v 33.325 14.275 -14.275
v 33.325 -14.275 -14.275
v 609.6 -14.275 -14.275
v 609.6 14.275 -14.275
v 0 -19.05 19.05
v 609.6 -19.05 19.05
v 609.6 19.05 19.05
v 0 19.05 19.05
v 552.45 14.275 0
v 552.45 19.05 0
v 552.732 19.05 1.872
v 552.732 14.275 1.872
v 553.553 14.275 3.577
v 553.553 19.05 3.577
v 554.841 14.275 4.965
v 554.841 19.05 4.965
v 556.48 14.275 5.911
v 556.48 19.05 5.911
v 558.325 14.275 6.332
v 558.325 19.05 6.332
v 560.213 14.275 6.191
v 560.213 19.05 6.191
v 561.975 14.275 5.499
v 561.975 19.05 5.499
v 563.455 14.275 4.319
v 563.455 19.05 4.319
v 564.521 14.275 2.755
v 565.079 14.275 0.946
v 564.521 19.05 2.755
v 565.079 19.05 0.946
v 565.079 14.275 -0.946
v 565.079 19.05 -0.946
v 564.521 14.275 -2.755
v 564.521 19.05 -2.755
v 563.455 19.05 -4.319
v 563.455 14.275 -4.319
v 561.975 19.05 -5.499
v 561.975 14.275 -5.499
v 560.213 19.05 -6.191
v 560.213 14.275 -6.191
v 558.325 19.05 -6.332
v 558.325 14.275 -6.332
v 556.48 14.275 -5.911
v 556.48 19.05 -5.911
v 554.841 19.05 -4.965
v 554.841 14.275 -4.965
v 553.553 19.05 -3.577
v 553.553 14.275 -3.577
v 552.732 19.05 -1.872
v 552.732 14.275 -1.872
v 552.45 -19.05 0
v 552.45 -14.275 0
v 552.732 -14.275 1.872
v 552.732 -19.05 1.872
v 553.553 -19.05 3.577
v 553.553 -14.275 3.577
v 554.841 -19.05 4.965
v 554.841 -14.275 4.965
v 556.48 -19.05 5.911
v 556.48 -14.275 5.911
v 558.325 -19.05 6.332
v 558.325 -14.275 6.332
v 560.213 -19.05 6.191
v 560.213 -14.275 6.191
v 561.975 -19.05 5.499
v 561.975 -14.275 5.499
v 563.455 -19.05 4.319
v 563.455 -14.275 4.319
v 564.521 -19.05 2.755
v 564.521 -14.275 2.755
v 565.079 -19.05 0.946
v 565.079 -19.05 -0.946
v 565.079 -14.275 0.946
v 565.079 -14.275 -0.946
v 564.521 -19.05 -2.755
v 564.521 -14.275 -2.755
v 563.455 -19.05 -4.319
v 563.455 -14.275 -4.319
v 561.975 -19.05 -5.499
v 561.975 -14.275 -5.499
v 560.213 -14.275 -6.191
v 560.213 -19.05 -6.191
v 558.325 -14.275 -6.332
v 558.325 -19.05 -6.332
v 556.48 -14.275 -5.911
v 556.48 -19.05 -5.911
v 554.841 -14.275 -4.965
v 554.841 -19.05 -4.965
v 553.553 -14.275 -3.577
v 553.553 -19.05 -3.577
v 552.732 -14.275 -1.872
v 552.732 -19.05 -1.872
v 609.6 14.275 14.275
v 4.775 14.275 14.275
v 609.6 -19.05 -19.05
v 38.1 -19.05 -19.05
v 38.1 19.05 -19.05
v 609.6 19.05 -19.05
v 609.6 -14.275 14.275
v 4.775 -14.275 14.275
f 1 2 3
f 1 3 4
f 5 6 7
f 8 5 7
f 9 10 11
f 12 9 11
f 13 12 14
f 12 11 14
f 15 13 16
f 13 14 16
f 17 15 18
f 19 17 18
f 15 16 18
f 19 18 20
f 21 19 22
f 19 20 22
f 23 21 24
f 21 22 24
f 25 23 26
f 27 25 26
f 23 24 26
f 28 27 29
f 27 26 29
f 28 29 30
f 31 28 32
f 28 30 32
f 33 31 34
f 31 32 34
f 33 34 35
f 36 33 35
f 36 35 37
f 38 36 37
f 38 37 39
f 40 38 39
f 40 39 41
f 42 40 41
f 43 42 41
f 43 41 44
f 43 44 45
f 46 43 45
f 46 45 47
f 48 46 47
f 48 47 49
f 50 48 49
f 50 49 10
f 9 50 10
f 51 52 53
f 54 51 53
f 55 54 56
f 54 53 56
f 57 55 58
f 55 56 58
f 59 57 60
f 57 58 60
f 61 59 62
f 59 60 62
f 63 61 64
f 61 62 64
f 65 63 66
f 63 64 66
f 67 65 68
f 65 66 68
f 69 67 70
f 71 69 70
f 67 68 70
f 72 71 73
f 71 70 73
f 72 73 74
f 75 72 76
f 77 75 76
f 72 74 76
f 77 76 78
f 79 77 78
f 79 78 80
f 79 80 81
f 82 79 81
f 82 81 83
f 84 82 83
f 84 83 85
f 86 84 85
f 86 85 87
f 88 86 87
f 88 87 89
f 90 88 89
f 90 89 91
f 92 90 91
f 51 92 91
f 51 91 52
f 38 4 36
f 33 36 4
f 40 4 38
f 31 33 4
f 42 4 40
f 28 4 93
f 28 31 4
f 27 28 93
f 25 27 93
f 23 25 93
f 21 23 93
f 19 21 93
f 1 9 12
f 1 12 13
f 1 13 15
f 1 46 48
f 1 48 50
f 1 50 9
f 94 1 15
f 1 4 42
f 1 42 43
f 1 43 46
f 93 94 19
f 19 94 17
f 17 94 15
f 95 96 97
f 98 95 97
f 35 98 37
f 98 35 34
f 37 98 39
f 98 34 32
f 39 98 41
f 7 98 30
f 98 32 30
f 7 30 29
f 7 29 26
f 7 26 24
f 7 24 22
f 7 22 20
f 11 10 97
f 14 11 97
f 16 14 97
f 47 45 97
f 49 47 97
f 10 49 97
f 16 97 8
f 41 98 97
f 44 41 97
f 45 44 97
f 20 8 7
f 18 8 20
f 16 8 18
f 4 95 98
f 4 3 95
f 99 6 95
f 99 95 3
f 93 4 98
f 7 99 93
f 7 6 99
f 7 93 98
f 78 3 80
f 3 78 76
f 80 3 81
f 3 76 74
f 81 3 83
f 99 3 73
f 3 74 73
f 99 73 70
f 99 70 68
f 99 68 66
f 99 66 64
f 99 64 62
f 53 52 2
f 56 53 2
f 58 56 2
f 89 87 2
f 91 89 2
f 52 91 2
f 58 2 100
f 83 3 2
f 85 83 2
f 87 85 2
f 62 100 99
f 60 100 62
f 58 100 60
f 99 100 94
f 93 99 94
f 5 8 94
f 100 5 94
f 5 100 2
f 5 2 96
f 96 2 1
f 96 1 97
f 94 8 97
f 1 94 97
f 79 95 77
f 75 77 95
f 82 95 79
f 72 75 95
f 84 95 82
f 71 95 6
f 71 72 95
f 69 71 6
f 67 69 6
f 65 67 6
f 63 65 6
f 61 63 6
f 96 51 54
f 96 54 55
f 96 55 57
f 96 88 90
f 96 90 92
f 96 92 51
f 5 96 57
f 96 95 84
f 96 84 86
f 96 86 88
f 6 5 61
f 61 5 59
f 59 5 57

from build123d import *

# Parameters (mm, degrees)
F0_W     = 38.1
F0_H     = 38.1
F0_W_2   = 28.5496
F0_H_2   = 28.5496
F1_DEPTH = 609.6
F3_DEPTH = 38.101
F4_R     = 6.35
F5_DEPTH = 38.101


with BuildPart() as f1:
    # F0 (on Right) → F1 (new body)
    with BuildSketch(Plane.YZ):
        Rectangle(F0_W, F0_H)
        Rectangle(F0_W_2, F0_H_2, mode=Mode.SUBTRACT)
    extrude(amount=F1_DEPTH)

    # F2 (on face) → F3 (cut, through all)
    with BuildSketch(Plane(origin=(0, 19.05, 0), x_dir=(-1, 0, 0), z_dir=(0, 1, 0))):
        Polygon((0, -19.05), (0, 19.05), (-38.1, -19.05), align=None)
    extrude(amount=-F3_DEPTH, mode=Mode.SUBTRACT)

    # F4 (on face) → F5 (cut, through all)
    with BuildSketch(Plane(origin=(0, 19.05, 0), x_dir=(-1, 0, 0), z_dir=(0, 1, 0))):
        with Locations((-558.8, 0)):
            Circle(F4_R)
    extrude(amount=-F5_DEPTH, mode=Mode.SUBTRACT)


solid = f1.part
